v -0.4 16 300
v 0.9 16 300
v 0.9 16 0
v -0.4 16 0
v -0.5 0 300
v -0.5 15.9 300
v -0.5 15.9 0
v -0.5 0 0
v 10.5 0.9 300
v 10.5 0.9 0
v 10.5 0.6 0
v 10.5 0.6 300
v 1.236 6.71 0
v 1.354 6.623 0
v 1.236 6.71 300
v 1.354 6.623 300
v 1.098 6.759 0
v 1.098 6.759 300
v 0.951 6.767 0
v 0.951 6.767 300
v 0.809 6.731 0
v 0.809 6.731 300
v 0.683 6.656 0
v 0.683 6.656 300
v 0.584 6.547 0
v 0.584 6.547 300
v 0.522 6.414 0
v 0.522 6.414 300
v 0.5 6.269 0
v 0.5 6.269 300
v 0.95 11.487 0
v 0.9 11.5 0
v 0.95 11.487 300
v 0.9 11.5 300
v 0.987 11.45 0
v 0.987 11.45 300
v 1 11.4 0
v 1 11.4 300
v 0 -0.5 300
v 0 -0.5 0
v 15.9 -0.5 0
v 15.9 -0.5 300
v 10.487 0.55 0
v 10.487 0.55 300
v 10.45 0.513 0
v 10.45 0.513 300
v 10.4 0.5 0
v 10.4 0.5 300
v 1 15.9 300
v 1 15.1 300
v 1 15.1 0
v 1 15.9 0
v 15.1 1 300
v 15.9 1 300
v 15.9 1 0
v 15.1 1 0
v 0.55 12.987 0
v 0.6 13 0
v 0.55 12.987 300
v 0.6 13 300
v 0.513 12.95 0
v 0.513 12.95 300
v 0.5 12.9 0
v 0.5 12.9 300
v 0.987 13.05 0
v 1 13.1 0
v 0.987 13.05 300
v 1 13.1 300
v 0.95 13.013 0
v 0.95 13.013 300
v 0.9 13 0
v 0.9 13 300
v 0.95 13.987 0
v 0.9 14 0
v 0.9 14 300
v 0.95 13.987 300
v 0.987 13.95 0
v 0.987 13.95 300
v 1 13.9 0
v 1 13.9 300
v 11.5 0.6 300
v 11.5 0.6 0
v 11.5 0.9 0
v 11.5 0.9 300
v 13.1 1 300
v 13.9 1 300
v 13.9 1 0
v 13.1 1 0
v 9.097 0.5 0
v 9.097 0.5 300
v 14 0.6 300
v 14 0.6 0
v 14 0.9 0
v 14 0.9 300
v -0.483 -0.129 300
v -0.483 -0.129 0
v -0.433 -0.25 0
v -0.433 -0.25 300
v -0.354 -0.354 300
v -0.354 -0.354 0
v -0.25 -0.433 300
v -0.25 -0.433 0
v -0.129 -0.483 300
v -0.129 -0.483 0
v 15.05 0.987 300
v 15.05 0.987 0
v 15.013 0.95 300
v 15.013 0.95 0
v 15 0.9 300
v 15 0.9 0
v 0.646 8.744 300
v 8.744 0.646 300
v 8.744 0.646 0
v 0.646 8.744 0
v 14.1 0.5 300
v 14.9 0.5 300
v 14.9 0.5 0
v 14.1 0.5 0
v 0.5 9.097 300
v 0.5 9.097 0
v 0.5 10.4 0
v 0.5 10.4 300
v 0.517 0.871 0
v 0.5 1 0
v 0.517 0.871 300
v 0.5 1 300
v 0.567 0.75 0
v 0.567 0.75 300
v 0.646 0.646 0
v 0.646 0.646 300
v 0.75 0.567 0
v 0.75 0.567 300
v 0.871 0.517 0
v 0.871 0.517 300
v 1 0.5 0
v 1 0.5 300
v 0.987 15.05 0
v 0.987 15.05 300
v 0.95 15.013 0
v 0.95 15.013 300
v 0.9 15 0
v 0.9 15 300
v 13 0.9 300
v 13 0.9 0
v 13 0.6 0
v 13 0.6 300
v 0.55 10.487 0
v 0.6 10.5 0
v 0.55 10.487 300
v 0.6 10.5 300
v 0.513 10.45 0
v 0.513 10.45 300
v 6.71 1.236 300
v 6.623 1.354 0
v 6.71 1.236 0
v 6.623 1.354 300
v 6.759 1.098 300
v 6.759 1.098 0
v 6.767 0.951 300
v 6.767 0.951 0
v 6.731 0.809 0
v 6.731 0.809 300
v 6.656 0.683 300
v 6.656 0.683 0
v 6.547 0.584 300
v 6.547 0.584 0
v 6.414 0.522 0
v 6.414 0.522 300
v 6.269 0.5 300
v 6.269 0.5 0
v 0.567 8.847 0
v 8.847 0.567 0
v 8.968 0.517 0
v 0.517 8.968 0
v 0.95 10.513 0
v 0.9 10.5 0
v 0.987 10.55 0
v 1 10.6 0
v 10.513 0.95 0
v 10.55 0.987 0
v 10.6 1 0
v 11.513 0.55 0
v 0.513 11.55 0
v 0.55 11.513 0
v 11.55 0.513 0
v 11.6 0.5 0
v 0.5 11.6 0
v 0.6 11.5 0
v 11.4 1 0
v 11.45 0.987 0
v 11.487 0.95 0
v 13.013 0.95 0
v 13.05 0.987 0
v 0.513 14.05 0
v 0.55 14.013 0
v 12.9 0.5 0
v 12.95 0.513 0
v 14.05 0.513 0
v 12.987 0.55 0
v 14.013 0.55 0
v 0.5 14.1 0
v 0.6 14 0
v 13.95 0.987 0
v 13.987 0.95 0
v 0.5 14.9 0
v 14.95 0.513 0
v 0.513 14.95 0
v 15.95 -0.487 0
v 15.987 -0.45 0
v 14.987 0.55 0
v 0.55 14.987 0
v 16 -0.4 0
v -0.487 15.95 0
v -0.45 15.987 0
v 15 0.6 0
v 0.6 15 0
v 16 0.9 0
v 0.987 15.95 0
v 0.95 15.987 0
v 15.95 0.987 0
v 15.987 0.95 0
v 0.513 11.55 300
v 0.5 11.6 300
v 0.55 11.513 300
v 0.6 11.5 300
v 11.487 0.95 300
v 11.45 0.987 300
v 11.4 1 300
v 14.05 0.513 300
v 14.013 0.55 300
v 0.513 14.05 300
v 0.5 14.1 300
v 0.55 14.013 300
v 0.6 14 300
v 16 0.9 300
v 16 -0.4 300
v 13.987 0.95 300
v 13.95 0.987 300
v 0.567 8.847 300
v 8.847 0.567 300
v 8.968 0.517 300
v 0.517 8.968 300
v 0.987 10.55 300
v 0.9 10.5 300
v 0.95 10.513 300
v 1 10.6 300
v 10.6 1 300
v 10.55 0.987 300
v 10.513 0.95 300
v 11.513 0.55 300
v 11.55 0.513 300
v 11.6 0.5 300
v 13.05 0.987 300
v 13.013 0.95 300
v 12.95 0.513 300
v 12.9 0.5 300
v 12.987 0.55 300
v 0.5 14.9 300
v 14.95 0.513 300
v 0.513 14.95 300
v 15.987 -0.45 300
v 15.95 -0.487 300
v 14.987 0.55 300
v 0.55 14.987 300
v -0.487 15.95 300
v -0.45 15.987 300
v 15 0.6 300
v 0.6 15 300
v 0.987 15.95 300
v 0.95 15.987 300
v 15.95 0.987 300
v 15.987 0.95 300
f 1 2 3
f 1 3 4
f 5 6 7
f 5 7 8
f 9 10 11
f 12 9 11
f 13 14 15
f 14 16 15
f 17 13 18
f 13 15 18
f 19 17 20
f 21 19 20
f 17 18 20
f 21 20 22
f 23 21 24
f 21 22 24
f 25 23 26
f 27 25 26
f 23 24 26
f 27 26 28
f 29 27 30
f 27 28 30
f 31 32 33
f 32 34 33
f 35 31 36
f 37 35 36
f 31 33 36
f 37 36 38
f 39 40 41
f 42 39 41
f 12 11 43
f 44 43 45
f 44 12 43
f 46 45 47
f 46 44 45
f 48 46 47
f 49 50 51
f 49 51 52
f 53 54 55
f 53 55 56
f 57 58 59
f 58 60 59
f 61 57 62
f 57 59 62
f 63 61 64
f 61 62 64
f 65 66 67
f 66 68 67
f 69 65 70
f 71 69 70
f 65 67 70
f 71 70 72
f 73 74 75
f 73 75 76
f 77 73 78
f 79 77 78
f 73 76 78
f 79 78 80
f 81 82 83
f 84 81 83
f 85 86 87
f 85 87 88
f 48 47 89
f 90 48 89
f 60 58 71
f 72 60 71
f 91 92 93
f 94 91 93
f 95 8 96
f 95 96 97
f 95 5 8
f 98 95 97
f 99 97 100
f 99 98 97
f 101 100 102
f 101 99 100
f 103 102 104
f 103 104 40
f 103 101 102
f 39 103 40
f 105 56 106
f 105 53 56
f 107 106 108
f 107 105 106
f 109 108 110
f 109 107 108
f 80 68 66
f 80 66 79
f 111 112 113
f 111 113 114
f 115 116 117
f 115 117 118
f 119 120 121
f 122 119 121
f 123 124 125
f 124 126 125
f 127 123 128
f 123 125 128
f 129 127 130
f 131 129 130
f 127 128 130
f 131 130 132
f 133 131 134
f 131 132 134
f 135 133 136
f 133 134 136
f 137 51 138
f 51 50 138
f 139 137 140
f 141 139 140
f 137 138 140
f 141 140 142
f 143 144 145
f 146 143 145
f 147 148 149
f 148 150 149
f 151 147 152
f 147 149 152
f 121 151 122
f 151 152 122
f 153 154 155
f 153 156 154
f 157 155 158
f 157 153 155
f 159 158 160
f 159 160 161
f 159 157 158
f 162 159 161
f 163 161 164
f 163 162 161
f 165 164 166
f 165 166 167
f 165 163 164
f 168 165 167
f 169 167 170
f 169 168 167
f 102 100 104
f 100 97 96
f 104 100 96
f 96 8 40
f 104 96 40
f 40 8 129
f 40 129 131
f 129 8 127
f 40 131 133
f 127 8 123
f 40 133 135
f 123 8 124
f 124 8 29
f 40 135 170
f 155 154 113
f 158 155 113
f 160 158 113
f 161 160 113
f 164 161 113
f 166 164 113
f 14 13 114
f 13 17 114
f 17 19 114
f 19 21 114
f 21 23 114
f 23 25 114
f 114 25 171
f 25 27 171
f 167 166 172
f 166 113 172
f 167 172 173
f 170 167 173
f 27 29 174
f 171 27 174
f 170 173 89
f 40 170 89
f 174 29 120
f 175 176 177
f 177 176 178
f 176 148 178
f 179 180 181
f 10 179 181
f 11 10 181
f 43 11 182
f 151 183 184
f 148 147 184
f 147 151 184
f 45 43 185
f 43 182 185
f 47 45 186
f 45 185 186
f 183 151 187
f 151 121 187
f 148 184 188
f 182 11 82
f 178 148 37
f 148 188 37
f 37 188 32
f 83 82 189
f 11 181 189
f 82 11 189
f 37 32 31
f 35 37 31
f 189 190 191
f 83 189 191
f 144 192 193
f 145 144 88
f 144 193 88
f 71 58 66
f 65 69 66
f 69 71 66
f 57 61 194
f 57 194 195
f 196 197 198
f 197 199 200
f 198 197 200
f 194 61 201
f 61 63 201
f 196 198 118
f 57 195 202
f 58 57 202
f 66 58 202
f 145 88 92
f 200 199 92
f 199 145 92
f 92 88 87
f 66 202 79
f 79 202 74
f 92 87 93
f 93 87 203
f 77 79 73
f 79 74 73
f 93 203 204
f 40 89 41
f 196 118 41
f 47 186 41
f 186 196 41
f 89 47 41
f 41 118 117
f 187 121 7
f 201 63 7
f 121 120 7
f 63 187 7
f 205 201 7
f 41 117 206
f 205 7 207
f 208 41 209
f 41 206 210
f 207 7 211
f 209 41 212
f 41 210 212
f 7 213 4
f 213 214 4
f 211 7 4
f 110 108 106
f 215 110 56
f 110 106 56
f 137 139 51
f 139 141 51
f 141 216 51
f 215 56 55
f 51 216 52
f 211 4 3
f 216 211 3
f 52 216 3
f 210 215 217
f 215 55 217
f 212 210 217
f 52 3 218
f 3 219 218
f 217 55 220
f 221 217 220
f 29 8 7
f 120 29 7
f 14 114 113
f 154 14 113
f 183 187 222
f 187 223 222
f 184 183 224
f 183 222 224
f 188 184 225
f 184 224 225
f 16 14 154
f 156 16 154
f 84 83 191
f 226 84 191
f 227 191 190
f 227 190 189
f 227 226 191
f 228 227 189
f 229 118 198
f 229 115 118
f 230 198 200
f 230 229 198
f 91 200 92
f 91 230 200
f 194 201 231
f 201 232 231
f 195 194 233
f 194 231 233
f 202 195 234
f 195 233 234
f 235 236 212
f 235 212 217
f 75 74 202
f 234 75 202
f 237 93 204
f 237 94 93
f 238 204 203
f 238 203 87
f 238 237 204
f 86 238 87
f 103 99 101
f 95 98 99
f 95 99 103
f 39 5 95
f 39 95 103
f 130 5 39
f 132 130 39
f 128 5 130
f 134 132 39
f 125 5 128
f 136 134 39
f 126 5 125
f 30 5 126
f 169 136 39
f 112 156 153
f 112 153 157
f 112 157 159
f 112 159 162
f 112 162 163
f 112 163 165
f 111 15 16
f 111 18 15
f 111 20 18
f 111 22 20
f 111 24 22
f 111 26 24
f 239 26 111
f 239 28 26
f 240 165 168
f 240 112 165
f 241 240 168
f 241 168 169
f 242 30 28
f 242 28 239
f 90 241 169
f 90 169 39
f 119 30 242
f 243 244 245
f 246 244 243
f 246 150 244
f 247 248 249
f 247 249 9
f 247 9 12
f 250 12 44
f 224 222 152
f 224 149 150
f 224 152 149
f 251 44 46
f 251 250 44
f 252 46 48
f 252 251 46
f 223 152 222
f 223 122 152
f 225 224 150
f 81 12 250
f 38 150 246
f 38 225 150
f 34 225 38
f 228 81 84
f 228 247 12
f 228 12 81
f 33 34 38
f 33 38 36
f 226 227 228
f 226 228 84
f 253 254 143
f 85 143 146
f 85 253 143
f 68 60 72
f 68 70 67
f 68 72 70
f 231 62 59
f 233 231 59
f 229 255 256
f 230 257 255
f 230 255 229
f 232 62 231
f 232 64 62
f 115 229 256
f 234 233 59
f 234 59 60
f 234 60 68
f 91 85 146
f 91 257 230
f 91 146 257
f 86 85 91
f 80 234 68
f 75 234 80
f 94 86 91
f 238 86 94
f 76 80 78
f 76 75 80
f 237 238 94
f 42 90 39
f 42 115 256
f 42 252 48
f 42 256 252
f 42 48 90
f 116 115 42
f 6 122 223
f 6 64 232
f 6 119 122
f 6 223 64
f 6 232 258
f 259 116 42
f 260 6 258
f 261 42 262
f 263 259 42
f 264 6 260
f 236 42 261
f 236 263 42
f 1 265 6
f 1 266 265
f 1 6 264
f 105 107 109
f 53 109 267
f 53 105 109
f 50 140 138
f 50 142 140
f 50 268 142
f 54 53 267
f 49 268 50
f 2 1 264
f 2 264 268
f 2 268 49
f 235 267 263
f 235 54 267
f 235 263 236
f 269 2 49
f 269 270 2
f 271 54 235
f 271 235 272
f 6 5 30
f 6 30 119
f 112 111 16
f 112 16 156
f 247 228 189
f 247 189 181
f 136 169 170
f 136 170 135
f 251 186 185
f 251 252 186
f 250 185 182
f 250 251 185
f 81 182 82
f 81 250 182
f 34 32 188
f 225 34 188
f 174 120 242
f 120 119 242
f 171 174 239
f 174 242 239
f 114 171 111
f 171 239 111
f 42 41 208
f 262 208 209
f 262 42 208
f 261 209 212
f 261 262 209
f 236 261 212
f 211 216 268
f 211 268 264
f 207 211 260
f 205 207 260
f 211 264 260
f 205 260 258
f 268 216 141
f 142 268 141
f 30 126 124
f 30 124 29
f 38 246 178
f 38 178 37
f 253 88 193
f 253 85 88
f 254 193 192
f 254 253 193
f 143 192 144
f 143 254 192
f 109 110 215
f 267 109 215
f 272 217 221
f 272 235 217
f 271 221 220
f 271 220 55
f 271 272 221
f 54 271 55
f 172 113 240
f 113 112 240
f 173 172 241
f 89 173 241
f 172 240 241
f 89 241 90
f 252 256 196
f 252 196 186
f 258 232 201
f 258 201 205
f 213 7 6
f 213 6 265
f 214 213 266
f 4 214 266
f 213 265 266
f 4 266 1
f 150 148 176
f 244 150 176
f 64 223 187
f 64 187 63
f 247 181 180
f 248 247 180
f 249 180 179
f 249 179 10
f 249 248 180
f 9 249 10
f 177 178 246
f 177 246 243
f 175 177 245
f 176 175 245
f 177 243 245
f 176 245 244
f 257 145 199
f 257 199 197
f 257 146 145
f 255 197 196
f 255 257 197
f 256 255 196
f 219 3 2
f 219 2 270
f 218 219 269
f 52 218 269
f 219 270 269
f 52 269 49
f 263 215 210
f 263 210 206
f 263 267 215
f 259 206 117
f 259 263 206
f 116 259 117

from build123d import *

# Parameters (mm, degrees)
EXTRUDE_THIN4_DEPTH = 300
FILLET2_R           = 0.5
FILLET4_R           = 0.1


# Read off the part's stored shape, not the designer's step: Extrude-Thin4
with BuildPart() as part:
    # Extrude-Thin4 outline → Extrude-Thin4 (new body)
    with BuildSketch(Plane.XY):
        Polygon((-0.5, 16), (-0.5, -0.5), (16, -0.5), (16, 1), (15, 1), (15, 0.5), (14, 0.5), (14, 1), (13, 1), (13, 0.5), (11.5, 0.5), (11.5, 1), (10.5, 1), (10.5, 0.5), (8.890378054, 0.5), (0.5, 8.890378054), (0.5, 10.5), (1, 10.5), (1, 11.5), (0.5, 11.5), (0.5, 13), (1, 13), (1, 14), (0.5, 14), (0.5, 15), (1, 15), (1, 16), align=None)
        Polygon((7.476164492, 0.5), (0.5, 0.5), (0.5, 7.476164492), align=None, mode=Mode.SUBTRACT)
    extrude(amount=EXTRUDE_THIN4_DEPTH)

    # Fillet2
    fillet2_edges = [part.edges().sort_by_distance(p)[0] for p in [
        (-0.5, -0.5, 150),
        (0.5, 0.5, 150),
        (0.5, 7.476164492, 150),
        (0.5, 8.890378054, 150),
        (7.476164492, 0.5, 150),
        (8.890378054, 0.5, 150),
    ]]
    fillet(fillet2_edges, radius=FILLET2_R)

    # Fillet4
    fillet4_edges = [part.edges().sort_by_distance(p)[0] for p in [
        (16, -0.5, 150),
        (-0.5, 16, 150),
        (1, 16, 150),
        (1, 15, 150),
        (0.5, 15, 150),
        (15, 0.5, 150),
        (15, 1, 150),
        (16, 1, 150),
        (0.5, 11.5, 150),
        (0.5, 10.5, 150),
        (0.5, 14, 150),
        (0.5, 13, 150),
        (13, 0.5, 150),
        (14, 0.5, 150),
        (10.5, 0.5, 150),
        (11.5, 0.5, 150),
        (11.5, 1, 150),
        (10.5, 1, 150),
        (14, 1, 150),
        (13, 1, 150),
        (1, 13, 150),
        (1, 14, 150),
        (1, 10.5, 150),
        (1, 11.5, 150),
    ]]
    fillet(fillet4_edges, radius=FILLET4_R)


solid = part.part
